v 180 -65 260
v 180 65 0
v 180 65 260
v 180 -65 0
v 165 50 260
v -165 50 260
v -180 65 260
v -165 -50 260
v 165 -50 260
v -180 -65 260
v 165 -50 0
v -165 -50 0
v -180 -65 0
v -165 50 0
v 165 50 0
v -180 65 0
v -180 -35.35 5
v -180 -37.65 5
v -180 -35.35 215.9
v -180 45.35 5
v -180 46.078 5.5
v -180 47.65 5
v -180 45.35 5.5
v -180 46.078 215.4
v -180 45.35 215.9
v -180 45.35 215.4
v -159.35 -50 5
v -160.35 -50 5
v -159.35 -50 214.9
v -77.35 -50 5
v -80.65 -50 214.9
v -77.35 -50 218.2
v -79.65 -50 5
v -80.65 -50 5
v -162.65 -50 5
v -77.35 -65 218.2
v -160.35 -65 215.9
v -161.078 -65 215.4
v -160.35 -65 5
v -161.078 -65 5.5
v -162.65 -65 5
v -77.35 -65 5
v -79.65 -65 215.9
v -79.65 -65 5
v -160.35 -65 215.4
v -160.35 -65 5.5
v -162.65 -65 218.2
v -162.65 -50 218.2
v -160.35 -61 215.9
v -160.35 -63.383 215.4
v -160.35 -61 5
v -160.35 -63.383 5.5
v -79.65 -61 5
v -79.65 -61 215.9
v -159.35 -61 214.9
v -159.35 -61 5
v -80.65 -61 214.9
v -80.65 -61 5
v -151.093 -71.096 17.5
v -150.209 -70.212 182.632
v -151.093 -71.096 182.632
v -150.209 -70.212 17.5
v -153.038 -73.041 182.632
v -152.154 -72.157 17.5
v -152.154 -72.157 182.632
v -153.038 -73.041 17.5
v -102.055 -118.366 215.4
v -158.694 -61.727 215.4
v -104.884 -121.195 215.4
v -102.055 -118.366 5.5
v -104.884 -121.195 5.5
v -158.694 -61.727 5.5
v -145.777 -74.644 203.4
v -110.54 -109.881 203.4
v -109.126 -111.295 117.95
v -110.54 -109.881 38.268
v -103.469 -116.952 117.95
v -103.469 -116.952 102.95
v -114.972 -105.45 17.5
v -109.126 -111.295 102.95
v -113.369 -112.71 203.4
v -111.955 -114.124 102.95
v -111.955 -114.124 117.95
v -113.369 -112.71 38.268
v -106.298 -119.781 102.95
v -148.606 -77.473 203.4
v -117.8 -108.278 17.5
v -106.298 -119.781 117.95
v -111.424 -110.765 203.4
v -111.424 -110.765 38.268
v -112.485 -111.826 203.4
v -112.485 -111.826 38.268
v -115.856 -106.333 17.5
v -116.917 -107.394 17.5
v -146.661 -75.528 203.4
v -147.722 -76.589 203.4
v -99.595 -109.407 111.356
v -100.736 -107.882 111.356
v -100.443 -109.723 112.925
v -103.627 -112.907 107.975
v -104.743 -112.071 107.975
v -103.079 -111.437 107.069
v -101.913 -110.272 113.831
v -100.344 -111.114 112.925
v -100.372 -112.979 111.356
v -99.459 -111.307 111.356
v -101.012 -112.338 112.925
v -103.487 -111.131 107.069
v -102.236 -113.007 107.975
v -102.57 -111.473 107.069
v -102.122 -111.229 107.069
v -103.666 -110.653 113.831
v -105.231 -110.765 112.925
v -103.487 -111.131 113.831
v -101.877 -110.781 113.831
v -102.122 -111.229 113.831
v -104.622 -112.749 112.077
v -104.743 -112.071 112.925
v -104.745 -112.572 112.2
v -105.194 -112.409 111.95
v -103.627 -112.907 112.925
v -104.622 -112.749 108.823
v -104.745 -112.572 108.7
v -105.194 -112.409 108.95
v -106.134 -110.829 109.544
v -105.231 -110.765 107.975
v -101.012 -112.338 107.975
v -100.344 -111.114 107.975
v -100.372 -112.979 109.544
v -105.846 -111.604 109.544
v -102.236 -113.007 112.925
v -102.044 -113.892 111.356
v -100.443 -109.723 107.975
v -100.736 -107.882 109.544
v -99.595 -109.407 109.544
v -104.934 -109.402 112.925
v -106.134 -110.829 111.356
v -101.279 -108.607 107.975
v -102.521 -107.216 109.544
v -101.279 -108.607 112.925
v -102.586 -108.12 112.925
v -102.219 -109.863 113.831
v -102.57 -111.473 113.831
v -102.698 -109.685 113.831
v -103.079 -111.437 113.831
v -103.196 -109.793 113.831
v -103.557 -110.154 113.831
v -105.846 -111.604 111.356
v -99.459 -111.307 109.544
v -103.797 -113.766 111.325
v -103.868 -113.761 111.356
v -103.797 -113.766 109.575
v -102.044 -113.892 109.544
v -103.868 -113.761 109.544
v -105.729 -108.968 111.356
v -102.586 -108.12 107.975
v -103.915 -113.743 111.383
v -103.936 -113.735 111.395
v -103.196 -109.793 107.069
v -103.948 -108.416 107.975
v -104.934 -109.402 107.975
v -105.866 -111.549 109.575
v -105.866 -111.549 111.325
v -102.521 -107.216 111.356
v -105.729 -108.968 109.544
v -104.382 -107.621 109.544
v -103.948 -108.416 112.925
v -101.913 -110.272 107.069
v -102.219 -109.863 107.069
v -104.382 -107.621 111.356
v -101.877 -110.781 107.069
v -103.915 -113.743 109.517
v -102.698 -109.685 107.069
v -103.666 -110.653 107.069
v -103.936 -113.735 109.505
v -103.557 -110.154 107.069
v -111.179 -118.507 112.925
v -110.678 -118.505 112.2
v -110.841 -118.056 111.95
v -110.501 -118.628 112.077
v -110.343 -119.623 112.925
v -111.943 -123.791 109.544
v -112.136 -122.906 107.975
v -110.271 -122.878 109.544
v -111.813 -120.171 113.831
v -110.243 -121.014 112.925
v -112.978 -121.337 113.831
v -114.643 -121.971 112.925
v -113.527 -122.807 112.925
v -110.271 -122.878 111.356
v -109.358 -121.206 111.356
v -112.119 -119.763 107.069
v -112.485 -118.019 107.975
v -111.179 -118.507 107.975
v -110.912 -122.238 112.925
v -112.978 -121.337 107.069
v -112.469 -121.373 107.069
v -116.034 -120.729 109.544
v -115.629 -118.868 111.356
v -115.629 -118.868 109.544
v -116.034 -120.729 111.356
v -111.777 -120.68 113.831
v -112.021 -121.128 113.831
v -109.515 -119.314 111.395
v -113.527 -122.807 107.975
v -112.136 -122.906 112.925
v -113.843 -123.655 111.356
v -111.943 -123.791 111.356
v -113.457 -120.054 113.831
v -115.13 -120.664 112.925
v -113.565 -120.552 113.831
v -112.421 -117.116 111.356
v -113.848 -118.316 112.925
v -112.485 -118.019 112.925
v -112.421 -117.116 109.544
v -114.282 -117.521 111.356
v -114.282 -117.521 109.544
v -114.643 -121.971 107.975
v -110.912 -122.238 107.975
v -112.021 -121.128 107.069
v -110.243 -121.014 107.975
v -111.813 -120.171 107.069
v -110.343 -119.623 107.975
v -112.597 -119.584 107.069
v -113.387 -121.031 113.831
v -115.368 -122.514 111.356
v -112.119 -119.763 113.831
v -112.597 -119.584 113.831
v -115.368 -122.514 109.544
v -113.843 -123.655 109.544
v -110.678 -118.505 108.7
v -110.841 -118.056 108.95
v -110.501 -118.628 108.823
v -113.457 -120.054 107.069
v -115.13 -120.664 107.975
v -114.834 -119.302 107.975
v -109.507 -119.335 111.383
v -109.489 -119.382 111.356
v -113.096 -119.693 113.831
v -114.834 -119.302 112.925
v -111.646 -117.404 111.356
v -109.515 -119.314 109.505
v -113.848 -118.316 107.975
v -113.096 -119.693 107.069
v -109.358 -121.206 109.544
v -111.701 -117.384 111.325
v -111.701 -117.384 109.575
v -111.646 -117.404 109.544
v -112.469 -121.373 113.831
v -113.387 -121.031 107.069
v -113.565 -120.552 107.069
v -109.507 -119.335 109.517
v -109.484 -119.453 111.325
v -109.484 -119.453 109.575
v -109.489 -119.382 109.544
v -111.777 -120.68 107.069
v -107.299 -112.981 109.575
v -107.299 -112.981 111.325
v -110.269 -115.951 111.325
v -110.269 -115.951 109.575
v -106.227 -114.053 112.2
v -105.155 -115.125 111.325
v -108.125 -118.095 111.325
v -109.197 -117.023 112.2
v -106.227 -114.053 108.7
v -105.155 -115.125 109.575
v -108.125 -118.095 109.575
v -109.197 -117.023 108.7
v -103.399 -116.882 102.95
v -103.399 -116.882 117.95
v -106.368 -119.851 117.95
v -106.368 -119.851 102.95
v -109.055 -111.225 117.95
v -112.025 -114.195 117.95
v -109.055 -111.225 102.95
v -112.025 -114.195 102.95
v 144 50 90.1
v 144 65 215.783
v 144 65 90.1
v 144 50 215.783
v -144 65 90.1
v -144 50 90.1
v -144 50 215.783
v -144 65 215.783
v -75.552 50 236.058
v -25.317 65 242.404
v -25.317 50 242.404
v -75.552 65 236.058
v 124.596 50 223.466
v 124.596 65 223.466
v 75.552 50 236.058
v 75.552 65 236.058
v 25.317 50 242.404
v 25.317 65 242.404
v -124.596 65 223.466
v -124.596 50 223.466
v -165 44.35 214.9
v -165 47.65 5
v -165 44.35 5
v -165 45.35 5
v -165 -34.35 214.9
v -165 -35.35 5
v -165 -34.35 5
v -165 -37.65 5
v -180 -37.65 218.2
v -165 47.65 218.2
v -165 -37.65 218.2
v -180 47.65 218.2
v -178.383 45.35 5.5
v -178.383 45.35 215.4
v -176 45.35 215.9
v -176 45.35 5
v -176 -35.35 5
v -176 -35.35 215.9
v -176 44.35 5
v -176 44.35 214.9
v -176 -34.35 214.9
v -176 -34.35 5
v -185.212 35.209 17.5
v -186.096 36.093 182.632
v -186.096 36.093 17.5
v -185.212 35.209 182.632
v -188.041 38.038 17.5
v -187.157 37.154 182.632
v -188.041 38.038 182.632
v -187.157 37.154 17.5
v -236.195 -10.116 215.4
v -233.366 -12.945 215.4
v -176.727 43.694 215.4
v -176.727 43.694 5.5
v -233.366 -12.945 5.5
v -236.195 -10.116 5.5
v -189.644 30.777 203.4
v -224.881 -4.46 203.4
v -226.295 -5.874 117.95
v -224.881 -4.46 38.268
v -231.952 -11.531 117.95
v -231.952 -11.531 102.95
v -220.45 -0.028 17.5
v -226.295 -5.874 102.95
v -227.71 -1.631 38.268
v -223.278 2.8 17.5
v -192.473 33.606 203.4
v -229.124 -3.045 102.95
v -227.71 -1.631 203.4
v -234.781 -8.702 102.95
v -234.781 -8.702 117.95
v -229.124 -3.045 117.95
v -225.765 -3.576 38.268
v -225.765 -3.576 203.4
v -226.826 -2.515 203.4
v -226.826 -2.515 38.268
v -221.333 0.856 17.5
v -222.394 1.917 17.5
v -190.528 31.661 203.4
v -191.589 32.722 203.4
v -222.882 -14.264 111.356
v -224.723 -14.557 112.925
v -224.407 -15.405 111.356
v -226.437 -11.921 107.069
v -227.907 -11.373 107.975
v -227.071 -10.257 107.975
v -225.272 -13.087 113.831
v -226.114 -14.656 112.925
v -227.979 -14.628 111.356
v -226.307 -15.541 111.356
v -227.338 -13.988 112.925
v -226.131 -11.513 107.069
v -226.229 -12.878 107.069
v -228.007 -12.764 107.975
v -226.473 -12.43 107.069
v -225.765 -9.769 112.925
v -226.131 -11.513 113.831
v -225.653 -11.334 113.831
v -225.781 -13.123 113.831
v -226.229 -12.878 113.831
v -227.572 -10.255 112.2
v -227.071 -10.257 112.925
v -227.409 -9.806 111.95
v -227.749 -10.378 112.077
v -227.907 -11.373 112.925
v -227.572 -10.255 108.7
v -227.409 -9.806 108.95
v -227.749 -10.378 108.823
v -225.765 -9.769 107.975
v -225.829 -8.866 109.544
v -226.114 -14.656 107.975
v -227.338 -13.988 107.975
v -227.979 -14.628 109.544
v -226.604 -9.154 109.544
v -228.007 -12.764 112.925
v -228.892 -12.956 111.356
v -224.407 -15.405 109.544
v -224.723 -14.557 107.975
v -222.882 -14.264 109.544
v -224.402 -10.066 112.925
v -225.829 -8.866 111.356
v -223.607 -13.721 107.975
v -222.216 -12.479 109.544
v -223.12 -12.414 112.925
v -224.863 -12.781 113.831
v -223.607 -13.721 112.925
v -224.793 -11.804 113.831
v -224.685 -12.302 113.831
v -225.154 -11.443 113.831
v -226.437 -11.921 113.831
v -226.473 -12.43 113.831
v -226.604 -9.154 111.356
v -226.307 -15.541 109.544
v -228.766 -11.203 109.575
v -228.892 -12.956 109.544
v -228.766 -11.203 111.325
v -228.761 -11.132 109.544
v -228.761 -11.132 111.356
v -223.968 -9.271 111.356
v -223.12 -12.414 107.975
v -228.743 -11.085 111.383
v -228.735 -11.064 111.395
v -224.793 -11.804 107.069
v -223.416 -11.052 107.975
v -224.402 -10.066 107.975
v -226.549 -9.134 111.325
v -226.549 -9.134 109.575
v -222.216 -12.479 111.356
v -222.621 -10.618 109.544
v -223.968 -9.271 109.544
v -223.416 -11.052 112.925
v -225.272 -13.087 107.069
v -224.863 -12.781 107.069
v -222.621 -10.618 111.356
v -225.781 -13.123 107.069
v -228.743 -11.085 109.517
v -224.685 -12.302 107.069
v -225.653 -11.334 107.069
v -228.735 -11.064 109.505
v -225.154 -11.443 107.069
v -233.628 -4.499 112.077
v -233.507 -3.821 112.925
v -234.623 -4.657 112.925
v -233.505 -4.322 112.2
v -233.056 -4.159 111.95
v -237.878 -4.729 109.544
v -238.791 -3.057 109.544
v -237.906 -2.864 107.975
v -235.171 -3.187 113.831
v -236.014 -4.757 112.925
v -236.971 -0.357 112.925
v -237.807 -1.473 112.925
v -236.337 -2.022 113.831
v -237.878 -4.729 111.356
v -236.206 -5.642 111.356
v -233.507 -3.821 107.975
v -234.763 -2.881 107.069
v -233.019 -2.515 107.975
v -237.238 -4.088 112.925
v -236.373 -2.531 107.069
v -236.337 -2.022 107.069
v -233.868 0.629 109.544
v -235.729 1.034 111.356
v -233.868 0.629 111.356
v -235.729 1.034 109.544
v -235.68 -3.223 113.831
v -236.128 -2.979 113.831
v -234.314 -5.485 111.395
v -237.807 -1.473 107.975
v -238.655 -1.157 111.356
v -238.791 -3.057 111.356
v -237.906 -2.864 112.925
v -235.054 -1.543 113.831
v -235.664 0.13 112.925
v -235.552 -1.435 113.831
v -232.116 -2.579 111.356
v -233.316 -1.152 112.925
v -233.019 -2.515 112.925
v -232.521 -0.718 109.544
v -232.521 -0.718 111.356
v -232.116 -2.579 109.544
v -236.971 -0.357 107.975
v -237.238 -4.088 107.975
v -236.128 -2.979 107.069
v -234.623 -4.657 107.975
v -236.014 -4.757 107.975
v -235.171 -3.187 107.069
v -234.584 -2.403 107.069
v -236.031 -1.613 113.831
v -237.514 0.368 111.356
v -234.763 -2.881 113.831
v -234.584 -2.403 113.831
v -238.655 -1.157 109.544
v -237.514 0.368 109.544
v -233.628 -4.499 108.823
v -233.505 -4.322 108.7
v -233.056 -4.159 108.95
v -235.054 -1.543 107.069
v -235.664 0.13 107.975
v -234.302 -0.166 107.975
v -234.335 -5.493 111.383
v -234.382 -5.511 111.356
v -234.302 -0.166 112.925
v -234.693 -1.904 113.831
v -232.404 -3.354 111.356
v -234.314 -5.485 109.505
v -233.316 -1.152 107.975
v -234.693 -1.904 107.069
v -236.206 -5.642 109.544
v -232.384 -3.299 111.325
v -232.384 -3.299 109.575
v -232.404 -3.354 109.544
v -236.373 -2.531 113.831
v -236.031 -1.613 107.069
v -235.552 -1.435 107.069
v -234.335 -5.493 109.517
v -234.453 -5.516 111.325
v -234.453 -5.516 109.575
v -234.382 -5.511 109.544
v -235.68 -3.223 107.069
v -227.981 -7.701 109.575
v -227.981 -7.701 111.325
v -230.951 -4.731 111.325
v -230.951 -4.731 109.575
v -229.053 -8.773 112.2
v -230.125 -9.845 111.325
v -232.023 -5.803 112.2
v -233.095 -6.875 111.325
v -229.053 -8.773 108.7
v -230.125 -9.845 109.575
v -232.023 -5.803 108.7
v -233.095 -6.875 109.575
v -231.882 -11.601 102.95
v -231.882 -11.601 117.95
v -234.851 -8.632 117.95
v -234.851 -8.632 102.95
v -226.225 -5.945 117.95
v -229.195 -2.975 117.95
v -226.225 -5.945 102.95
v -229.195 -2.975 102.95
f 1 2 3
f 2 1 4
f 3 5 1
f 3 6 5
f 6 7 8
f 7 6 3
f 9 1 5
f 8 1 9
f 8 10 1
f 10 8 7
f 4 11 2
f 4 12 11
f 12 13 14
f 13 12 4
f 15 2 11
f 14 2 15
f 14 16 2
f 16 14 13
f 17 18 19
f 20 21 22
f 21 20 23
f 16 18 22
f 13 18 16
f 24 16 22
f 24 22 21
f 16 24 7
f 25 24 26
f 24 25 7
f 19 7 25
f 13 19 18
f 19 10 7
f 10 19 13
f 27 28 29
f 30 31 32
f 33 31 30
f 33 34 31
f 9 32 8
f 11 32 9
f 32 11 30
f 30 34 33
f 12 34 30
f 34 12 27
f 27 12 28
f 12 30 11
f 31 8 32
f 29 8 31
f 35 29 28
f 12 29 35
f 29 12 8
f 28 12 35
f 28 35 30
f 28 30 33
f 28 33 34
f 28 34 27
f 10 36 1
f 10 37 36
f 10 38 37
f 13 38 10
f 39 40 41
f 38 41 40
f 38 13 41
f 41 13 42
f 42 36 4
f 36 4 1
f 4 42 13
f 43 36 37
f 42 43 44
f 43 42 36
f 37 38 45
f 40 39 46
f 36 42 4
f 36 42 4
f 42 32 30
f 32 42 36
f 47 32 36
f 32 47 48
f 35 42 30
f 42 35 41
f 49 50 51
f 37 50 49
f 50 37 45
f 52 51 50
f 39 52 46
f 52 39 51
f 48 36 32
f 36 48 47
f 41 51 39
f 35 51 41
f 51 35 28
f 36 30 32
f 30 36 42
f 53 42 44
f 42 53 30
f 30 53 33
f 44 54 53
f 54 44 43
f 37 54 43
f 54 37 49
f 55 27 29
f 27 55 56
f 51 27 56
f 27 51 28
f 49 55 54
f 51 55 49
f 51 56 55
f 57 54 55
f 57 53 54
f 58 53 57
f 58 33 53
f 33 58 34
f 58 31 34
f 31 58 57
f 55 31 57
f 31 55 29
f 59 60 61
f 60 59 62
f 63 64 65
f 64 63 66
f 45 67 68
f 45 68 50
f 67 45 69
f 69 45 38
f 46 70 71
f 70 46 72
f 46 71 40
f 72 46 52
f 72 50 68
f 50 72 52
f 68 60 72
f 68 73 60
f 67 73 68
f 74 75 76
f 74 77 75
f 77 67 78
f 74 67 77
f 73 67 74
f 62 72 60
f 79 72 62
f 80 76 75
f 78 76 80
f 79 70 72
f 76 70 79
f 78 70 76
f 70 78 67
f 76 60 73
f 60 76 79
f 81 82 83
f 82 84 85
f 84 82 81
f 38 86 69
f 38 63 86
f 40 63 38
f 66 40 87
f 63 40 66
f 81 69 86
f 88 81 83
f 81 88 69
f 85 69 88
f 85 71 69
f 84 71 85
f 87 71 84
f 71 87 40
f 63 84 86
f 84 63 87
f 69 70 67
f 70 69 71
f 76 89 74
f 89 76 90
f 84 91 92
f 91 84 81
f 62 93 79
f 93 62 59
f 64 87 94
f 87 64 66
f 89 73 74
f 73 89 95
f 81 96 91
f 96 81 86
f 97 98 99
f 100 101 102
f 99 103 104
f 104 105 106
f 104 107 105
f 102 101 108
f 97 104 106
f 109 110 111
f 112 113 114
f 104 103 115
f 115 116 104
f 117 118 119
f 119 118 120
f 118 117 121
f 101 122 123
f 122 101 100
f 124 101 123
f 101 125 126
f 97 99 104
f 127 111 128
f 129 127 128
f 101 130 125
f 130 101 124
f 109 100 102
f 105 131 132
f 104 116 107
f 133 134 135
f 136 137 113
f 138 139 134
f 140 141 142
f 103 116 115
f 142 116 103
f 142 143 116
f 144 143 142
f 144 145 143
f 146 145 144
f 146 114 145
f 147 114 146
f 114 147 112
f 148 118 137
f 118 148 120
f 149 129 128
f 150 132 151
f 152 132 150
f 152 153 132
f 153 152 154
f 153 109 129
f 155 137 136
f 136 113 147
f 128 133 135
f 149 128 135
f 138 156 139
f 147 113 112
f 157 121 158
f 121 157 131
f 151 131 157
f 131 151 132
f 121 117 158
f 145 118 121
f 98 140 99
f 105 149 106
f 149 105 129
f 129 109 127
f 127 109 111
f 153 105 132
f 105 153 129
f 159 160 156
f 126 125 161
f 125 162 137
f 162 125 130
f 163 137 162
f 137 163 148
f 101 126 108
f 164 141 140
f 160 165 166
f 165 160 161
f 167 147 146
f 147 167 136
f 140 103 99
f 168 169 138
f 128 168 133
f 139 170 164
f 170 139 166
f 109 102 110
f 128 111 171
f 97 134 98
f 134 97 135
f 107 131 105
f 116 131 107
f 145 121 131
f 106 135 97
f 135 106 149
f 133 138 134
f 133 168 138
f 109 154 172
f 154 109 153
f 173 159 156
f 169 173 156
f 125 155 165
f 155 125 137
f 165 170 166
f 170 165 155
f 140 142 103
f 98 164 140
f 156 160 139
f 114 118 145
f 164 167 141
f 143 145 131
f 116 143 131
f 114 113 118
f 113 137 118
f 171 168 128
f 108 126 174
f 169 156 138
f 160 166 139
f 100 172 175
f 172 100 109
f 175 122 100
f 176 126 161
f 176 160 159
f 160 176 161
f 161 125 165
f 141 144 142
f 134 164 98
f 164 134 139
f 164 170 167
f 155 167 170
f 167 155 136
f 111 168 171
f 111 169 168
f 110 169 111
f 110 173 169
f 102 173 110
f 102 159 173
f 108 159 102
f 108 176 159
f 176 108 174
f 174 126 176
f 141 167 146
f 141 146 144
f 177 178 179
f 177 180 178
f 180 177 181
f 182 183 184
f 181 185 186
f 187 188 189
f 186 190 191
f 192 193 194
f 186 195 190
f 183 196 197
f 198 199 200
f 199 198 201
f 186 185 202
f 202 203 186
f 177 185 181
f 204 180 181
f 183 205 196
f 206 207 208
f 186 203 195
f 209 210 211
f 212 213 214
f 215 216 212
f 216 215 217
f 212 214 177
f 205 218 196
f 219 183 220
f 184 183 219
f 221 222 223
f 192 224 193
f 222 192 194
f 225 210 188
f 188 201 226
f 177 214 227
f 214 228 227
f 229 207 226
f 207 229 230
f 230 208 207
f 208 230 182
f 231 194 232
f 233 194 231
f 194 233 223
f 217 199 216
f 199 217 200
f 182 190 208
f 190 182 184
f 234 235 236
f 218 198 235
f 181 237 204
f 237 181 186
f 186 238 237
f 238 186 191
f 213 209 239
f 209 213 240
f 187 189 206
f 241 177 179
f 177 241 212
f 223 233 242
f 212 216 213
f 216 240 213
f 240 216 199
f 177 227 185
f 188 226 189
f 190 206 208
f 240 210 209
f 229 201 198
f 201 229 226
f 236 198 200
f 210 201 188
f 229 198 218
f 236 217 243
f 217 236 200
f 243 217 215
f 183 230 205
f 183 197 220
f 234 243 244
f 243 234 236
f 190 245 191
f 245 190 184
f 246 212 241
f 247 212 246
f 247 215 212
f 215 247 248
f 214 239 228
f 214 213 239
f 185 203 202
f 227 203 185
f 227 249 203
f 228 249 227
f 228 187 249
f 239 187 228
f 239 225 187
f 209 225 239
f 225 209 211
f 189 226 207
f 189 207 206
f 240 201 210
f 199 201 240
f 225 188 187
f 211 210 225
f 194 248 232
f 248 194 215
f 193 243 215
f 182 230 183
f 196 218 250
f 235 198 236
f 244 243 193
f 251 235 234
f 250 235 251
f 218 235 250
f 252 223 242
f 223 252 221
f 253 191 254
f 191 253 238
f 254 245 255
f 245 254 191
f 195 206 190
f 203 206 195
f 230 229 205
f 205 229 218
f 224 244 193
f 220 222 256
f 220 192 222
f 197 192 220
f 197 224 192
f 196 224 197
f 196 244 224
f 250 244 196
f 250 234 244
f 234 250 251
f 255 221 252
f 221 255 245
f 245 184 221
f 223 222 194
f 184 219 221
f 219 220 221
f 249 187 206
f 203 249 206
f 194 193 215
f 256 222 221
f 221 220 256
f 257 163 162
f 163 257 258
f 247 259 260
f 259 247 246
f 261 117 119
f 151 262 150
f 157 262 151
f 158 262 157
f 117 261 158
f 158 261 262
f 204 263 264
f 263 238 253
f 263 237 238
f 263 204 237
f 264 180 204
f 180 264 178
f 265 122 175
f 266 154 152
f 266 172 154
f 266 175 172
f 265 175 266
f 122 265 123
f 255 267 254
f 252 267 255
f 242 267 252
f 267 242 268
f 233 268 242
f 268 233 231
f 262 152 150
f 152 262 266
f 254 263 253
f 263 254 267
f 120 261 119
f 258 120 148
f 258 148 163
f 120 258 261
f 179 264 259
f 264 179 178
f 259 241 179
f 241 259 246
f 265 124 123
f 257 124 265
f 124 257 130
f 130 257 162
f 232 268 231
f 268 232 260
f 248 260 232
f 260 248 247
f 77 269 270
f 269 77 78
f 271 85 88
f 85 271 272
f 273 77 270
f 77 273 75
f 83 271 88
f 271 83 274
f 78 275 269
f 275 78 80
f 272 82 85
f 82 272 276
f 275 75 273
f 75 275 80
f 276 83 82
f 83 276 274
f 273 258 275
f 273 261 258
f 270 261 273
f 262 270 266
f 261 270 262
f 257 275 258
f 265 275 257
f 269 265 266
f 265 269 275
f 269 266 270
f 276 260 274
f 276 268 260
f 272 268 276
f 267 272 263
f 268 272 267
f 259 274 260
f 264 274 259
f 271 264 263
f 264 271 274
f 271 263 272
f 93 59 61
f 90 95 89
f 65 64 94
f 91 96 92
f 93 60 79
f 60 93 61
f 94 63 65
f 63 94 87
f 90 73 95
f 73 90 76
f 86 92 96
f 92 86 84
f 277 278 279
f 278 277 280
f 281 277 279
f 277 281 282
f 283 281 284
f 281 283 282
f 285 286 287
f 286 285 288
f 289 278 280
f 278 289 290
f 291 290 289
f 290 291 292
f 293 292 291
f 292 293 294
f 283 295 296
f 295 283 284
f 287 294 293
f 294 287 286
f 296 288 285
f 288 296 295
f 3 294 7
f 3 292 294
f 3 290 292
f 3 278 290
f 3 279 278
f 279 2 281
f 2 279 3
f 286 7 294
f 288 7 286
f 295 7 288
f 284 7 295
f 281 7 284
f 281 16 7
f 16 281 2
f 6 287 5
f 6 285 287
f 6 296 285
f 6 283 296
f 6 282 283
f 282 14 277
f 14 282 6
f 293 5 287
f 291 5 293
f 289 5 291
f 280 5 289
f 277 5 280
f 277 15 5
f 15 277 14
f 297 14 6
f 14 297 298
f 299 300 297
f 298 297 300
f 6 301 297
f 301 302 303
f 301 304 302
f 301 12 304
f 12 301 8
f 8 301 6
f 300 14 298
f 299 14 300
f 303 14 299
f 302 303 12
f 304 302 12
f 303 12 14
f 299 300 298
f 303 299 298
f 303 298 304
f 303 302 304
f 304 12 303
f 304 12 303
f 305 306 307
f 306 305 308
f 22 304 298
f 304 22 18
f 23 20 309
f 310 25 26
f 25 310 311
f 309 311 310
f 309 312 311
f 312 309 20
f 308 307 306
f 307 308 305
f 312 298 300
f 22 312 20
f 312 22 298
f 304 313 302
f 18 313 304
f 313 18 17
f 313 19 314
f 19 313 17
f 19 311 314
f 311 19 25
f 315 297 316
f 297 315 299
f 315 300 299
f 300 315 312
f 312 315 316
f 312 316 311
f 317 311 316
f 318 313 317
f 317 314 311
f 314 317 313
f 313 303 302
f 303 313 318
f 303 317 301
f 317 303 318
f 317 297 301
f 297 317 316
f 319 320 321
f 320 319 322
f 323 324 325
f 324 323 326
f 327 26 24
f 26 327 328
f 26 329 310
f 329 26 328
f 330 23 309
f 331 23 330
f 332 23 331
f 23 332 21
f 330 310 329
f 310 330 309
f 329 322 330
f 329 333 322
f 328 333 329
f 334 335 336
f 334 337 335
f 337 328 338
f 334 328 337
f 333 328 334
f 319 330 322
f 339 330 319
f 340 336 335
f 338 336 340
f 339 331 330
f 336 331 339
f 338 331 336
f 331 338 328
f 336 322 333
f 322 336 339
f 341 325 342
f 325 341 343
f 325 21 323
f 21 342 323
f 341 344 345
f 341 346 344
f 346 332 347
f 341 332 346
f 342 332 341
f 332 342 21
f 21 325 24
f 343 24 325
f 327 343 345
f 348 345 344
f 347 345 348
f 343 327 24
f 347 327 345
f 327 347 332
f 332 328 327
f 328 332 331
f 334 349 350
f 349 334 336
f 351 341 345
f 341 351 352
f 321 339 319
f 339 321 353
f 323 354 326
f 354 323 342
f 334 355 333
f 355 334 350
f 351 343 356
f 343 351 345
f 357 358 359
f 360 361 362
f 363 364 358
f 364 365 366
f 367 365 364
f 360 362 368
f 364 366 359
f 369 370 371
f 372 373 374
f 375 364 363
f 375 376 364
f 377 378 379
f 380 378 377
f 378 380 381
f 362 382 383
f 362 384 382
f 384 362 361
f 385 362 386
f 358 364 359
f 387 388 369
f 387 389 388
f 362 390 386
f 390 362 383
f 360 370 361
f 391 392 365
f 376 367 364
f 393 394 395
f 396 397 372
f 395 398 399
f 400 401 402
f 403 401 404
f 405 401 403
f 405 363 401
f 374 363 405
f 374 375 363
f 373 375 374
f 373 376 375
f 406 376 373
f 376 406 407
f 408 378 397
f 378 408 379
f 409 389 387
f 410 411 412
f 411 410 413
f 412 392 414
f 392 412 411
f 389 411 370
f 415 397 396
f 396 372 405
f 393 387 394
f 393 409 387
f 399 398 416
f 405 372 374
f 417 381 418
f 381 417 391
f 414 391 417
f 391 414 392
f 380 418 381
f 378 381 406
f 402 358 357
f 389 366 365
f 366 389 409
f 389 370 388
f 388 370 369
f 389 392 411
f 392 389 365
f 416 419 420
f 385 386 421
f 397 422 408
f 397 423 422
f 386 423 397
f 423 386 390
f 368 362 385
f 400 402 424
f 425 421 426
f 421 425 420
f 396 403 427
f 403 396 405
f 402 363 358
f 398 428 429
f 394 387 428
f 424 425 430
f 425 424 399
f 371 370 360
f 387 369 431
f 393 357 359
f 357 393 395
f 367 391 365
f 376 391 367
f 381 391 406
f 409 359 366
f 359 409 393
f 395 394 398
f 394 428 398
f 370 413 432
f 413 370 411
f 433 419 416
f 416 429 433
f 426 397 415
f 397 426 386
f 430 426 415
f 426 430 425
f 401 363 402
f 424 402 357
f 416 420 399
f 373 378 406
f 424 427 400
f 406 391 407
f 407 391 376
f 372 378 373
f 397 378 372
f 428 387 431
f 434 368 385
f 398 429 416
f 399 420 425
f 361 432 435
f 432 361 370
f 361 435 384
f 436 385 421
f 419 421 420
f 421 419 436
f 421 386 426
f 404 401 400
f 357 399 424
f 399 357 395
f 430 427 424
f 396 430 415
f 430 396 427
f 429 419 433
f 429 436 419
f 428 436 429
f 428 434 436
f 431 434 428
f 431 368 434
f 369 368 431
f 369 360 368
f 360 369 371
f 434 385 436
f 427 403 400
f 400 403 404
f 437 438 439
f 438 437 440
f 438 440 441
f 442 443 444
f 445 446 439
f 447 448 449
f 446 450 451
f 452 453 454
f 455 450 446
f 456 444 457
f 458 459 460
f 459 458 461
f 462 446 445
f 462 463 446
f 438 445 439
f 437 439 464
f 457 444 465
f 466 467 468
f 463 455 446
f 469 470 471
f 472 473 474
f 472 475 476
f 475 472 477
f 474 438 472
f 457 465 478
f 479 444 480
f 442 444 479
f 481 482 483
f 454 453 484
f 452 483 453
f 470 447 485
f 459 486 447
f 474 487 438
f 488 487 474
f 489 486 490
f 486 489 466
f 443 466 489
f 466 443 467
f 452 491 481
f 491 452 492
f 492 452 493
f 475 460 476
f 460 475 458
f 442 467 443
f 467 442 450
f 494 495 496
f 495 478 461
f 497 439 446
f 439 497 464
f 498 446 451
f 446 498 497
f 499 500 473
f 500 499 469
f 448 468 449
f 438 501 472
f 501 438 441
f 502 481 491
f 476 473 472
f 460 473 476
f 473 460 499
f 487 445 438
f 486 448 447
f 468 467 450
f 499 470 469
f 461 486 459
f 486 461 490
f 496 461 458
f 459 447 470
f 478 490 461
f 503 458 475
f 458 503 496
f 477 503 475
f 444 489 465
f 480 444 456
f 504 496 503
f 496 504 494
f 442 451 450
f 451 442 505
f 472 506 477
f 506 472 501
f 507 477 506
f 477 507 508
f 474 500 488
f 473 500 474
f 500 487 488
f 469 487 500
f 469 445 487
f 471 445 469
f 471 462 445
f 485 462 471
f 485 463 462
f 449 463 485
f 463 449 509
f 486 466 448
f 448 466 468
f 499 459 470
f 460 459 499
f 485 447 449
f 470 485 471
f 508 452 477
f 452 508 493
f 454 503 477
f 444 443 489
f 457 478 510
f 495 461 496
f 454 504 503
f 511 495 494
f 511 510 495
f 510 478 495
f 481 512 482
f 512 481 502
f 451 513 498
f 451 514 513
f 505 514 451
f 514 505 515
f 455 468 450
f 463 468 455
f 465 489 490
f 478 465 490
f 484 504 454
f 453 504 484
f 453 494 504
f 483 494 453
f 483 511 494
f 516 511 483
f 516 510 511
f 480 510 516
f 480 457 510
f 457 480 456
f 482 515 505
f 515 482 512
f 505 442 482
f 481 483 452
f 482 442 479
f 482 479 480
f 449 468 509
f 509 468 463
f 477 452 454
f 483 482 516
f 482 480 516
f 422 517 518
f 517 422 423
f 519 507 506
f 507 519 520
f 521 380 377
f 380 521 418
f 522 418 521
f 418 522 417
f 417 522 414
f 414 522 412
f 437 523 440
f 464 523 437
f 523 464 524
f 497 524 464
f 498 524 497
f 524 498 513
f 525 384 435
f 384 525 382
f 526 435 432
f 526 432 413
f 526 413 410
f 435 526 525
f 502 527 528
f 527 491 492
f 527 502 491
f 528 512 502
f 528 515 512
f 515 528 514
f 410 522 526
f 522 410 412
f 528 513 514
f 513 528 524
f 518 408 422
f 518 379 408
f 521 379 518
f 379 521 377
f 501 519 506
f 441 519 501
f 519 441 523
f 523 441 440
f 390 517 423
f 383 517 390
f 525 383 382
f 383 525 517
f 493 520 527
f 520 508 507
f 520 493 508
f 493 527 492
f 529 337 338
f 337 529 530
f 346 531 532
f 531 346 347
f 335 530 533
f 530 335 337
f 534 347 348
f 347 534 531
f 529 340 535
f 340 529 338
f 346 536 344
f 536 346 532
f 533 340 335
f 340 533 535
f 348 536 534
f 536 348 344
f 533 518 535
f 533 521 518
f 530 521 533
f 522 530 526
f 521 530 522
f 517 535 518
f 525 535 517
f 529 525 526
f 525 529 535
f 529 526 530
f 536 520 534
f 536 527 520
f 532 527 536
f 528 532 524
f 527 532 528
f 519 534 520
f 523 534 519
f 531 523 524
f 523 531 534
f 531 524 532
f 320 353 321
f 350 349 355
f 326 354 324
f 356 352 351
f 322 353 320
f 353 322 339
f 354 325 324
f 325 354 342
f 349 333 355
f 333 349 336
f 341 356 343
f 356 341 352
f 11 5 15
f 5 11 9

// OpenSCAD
// file: ../doors/arcdoorhole.scad
module arcdoorhole(door_width=300, door_height=260,wall_thickness=15, wall_color=[0,0,1],wall_alpha=0.3)
{
    $fn = 50;
    r = 1.4 * door_width;
    dx = door_width / 2; 
    
    intersection() {
        color(wall_color,wall_alpha) 
        translate([0,0,door_height/2-0.1])
        cube([door_width, wall_thickness+0.2, door_height],center=true);
        
        color(wall_color,wall_alpha)
        translate([0,0, door_height - r])
        rotate([90,0,0]) 
        cylinder(h=wall_thickness+0.2, r=r, center=true); 
    }
}

// For testing
arcdoorhole();
// file: ../doors/basicdoor.scad
module basicdoor(width=95.3, height=213.2, wall_thickness=15, right_handed = true, open_angle = 0) 
{
    profile_width = 12;
    door_thickness = 4.0;
    frame_profile_width = 2.3;
    frame_profile_depth = wall_thickness;
    seal_profile_width = 1.0;
    
    /* Outer frame fixed to convrete wall. */
    color([0.3,0.0,0.1])
    basicdoorframe(false, width, height, frame_profile_width, frame_profile_depth);

    color([0.4,0.2,0.2])
    translate([0, door_thickness/2,-frame_profile_width/2])
    basicdoorframe(false, width - 2 * frame_profile_width,
        height - frame_profile_width, 
        seal_profile_width, frame_profile_depth - door_thickness);
    
    /* Calculate door size. */
    open_w = width - 2 * frame_profile_width - 0.6;
    open_h = height - frame_profile_width - 1.0;

    ow = open_w/2 + 0.2;
    translate([right_handed?-ow:ow, 
        -(frame_profile_depth-door_thickness)/2, -frame_profile_width/2])
    rotate([0, 0, right_handed?-open_angle:open_angle])
    translate([right_handed?ow:-ow, 0, 0])
     union() {
        /* Playwood */
        color([0.4,0.0,0.1])
        cube([open_w, 1.5, open_h], center=true);
        
        /* Door strengtehing. */
        color([0.5,0.2,0.2])
        basicdoorframe(true, open_w, open_h, profile_width, door_thickness);
        
         /* Diagonal strengthening */
        dx = open_w - 2*profile_width;
        dy = open_h - 2*profile_width;
        l = sqrt(dx*dx+dy*dy);
        rotate([0,-atan2(dx,dy), 0])
        color([0.5,0.2,0.2])
        cube([profile_width, door_thickness, l], center=true);
         
         /* Door knob */
         translate([open_w/2 - 6.0, 0, 0])
         color([218/255,172/255,96/255])
         doorknob(door_thickness);
    }
}

module basicdoorframe(draw_bottom=true,width=70, height=110, profile_width = 5, door_thickness = 8) 
{
    translate([-(width - profile_width)/2, 0, 0]) 
    cube([profile_width,door_thickness, height], center=true);
    
    translate([(width - profile_width)/2, 0, 0]) 
    cube([profile_width,door_thickness, height], center=true);

    if (draw_bottom) {
        translate([0, 0, -(height - profile_width)/2]) 
        cube([width, door_thickness, profile_width], center=true);
    }
    
    translate([0, 0, (height - profile_width)/2]) 
    cube([width, door_thickness, profile_width], center=true);
}    

module doorknob(door_thickness = 8)
{
    doorknob_length = 7;
    doorknob_r = 3.5;
    
    translate([0, doorknob_length, 0]) 
    sphere(r=doorknob_r);
    translate([0, -doorknob_length, 0]) 
    sphere(r=doorknob_r);
 
    rotate([90, 90, 0])
    cylinder(h = doorknob_length*2, r = 0.5 * doorknob_r, center=true);
   
    cube([8, door_thickness+0.2, 15],center=true); 
}

// For testing
basicdoor();
// main file
use <../doors/basicdoor.scad>
use <../doors/arcdoorhole.scad> 

module stairbox(width=130, length=360, wall_thickness=15, wall_height=260,wall_color=[255/255, 255/255, 255/255],wall_alpha=1.0) 
{
    /* Door opening size. We need some extra space for the door frame. */
    door_width = 80+5.3;
    door_height = 210+3.2;
    
    /* Position the door so that bottom of opening is 5 cm above floor level */
    door_y_pos = (wall_height-door_height)/2 - 5;
    
    /* Position the doors horizontally off the center. */
    door_x_pos = 5;
    door2_x_pos = -120;
   
    // Arc window
    arc_window_width = length * 0.8;
    arc_window_height = 153;
    arc_window_x_pos = 0;

    difference() {
         /* Wall */
        translate([0, -width/2 
            + wall_thickness/2, 
            wall_height/2]) 
        color(wall_color, wall_alpha)
        cube([length, wall_thickness, wall_height],center=true);

        /* Door hole 2 */
        translate([door2_x_pos, 
            -width/2 + wall_thickness/2,
            wall_height/2 - door_y_pos]) 
        color(wall_color, wall_alpha)
        cube([door_width, wall_thickness+1, door_height], center=true);
    }
    
    /* Door 2 */
    translate([door2_x_pos, 
        -width/2 + wall_thickness/2,
        wall_height/2 - door_y_pos]) 
    basicdoor(door_width, door_height, wall_thickness, true, 45);

    difference() {
        /* Wall */
        translate([0,width/2-wall_thickness/2, 
            wall_height/2]) 
        color(wall_color, wall_alpha)
        cube([length, wall_thickness, 
            wall_height],center=true);
        
          /* Arc window hole */
        translate([0,width/2 - wall_thickness/2 + arc_window_x_pos, 
            door_height - arc_window_height + 30])
        // rotate([0,0,90])
        arcdoorhole(arc_window_width, arc_window_height, wall_thickness, wall_color,wall_alpha);
    }
    
  // difference() {
        translate([length/2-wall_thickness/2, 0, wall_height/2]) 
        color(wall_color, wall_alpha)
        cube([wall_thickness, width, wall_height],center=true);
  //  }     

    difference() {
        translate([-length/2+wall_thickness/2, 0, wall_height/2])
        color(wall_color, wall_alpha)
        cube([wall_thickness, width, wall_height],center=true);

        /* Door hole 1 */
        translate([-length/2+wall_thickness/2,
            door_x_pos, 
            wall_height/2 - door_y_pos]) 
        color(wall_color, wall_alpha)
        cube([wall_thickness+1, door_width, door_height], center=true);
    }
    
    /* Door 1 */
    translate([-length/2+wall_thickness/2,
        door_x_pos, 
        wall_height/2 - door_y_pos]) 
    rotate([0,0,-90])
    basicdoor(door_width, door_height, wall_thickness, true, 45);
}

// For testing
stairbox();
